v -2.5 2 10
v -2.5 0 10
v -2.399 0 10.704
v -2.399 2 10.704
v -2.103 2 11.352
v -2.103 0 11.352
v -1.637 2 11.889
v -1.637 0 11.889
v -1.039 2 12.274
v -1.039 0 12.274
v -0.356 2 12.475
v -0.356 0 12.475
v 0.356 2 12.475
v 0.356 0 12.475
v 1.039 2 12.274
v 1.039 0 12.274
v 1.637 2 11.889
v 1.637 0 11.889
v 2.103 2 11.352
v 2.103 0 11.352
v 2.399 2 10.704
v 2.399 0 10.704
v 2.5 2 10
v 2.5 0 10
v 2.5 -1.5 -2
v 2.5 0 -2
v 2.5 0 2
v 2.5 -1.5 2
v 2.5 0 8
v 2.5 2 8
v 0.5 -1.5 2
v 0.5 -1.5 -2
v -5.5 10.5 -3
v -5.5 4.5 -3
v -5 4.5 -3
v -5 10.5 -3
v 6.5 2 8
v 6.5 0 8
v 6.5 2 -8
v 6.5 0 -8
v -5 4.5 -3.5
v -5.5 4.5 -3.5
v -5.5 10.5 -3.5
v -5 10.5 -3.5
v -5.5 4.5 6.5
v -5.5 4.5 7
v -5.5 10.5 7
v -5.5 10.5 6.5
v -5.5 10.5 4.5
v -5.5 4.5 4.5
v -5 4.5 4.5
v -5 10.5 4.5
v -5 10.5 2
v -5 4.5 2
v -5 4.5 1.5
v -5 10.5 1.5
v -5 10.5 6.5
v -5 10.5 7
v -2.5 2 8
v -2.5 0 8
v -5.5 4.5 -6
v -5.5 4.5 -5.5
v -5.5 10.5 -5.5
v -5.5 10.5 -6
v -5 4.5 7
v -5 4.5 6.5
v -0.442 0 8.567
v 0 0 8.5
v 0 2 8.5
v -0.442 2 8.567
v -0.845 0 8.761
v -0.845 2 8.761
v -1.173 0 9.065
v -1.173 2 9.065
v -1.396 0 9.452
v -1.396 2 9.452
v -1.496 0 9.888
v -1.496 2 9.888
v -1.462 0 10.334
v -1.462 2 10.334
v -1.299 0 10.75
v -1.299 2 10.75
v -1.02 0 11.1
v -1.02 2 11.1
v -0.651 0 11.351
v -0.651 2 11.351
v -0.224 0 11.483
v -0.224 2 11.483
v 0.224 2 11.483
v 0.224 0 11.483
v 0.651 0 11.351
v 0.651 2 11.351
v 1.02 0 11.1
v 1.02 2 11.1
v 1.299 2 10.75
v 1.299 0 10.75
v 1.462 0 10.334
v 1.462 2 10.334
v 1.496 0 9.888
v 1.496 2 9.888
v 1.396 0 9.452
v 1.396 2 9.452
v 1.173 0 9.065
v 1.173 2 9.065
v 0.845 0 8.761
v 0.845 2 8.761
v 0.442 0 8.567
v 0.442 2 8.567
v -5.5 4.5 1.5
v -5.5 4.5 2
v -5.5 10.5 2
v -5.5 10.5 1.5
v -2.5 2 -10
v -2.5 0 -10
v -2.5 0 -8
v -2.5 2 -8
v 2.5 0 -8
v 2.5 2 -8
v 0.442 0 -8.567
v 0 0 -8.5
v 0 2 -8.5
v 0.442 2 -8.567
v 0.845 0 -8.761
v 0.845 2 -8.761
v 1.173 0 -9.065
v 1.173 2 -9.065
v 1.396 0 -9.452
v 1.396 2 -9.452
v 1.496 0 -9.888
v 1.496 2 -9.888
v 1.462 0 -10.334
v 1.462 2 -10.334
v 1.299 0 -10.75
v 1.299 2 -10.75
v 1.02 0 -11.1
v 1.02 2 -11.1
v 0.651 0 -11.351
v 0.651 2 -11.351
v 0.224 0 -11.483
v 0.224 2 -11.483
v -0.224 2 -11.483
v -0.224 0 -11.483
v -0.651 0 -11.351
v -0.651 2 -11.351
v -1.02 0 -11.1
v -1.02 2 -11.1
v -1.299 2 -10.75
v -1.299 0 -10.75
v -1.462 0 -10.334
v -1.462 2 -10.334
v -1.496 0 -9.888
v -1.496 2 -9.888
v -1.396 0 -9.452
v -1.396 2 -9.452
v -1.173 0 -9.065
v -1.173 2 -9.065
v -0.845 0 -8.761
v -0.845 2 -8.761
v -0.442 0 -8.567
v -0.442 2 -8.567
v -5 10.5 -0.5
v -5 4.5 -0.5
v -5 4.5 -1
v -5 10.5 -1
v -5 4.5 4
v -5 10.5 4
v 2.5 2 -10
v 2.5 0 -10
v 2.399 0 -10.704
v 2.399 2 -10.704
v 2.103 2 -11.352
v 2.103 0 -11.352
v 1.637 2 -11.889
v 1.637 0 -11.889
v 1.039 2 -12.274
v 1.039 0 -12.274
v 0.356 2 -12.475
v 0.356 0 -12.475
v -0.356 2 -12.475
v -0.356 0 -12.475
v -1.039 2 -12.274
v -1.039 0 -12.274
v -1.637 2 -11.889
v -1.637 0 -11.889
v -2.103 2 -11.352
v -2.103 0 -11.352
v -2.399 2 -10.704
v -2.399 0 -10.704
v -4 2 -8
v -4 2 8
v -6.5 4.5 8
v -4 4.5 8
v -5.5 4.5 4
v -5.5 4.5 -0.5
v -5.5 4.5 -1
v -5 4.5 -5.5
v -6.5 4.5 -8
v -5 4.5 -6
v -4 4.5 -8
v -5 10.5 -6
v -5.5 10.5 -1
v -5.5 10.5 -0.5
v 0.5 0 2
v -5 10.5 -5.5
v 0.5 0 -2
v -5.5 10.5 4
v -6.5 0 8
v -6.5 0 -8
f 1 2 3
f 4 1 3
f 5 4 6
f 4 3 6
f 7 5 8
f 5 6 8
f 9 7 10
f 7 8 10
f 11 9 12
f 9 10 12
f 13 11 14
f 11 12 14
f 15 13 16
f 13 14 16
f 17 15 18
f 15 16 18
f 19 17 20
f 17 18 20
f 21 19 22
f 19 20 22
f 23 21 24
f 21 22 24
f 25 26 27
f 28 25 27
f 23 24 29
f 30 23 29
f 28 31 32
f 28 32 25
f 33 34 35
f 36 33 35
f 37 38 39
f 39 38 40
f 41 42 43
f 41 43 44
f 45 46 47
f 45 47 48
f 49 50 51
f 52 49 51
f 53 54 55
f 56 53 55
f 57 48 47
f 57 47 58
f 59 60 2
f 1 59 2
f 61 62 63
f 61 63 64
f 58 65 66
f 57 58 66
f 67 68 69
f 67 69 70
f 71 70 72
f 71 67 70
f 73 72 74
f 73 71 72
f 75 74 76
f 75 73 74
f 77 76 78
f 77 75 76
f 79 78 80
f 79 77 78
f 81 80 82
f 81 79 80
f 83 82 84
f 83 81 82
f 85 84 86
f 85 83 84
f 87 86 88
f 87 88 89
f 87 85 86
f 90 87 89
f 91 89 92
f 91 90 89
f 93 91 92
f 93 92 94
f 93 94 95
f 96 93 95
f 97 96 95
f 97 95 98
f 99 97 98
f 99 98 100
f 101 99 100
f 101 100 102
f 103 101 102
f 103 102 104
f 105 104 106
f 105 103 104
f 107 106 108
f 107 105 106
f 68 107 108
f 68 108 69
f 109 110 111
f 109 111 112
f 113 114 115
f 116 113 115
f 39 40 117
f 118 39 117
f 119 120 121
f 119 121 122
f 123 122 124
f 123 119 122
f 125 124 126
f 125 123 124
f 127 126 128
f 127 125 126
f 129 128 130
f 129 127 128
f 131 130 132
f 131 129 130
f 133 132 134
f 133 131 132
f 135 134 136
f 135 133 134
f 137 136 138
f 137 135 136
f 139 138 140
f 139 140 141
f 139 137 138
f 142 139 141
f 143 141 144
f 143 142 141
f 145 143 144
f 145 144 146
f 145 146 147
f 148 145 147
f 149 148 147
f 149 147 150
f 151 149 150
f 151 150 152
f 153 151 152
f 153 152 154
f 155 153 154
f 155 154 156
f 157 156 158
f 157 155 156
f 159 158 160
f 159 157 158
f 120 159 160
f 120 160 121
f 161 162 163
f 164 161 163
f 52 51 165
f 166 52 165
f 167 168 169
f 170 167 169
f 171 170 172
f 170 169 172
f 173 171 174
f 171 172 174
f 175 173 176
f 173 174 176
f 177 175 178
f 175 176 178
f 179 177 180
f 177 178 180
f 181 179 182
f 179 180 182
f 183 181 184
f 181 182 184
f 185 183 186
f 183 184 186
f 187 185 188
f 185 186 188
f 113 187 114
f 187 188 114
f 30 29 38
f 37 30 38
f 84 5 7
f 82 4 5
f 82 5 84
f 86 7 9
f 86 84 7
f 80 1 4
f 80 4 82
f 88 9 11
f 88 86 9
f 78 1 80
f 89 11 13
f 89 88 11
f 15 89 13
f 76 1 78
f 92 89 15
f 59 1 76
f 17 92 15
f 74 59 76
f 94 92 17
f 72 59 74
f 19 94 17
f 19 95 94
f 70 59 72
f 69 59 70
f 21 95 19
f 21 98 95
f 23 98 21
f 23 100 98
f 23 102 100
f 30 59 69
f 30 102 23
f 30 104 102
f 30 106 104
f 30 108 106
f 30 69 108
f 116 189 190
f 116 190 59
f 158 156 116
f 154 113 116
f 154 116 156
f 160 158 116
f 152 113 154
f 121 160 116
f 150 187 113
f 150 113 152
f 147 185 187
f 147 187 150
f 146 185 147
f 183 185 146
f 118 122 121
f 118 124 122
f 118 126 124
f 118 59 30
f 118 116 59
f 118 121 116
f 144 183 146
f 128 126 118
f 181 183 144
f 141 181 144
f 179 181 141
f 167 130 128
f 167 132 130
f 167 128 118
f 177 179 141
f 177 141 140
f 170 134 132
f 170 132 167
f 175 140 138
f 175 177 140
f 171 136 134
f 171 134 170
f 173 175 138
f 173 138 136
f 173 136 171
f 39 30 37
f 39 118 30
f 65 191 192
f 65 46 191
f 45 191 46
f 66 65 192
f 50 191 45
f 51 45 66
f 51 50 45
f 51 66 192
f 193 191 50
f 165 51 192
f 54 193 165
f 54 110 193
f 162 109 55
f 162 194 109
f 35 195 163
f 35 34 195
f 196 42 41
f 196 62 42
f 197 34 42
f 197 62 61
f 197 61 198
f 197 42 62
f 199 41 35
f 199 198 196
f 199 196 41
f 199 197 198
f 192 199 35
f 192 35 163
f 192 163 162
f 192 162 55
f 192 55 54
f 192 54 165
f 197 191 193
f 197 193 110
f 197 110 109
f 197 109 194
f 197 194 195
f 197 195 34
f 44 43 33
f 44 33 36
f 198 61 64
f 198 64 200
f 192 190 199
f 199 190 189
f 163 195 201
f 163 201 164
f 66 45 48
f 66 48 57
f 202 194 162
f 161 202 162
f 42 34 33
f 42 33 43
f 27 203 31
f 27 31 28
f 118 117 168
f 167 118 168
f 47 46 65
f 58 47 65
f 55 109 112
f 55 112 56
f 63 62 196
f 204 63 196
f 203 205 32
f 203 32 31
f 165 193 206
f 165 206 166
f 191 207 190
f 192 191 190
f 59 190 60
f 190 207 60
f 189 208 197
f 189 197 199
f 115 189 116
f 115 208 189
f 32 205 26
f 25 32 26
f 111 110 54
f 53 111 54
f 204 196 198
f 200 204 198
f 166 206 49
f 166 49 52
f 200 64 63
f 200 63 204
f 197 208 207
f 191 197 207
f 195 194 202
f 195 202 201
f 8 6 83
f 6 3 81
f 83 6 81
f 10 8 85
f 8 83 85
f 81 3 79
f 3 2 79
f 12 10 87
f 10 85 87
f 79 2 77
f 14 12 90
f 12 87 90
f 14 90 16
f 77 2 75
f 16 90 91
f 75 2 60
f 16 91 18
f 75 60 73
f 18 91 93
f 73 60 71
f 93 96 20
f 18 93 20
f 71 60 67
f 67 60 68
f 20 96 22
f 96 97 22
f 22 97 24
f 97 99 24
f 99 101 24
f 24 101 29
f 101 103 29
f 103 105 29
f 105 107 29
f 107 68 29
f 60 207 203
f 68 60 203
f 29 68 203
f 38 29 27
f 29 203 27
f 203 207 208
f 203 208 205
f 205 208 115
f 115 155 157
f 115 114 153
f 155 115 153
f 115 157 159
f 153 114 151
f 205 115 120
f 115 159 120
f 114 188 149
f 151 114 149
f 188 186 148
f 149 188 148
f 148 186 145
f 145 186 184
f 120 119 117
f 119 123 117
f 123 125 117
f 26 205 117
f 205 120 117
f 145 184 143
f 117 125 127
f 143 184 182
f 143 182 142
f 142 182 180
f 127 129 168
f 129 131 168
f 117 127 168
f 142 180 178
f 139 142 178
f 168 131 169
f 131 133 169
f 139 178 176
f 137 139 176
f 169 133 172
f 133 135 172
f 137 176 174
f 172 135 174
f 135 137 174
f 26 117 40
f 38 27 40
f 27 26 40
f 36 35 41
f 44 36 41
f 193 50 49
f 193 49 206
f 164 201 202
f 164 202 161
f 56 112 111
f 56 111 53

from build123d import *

# Parameters (mm, degrees)
SKETCH1_R           = 1.5
BOSS_EXTRUDE1_DEPTH = 2
SKETCH2_W           = 2.5
SKETCH2_H           = 2.5
SKETCH2_H_2         = 3
BOSS_EXTRUDE2_DEPTH = 2.5
SKETCH3_W           = 0.5
SKETCH3_H           = 0.5
BOSS_EXTRUDE3_DEPTH = 6
SKETCH4_W           = 2
SKETCH4_H           = 4
BOSS_EXTRUDE4_DEPTH = 1.5


with BuildPart() as part:
    # Sketch1 → Boss-Extrude1 (new body)
    with BuildSketch(Plane(origin=(0, 0, 0), x_dir=(1, 0, 0), z_dir=(0, 1, 0))):
        with BuildLine():
            Line((-6.5, -8), (-2.5, -8))
            Line((-2.5, -8), (-2.5, -10))
            ThreePointArc((-2.5, -10), (0, -12.5), (2.5, -10))
            Line((2.5, -10), (2.5, -8))
            Line((2.5, -8), (6.5, -8))
            Line((6.5, -8), (6.5, 8))
            Line((6.5, 8), (2.5, 8))
            Line((2.5, 8), (2.5, 10))
            ThreePointArc((2.5, 10), (0, 12.5), (-2.5, 10))
            Line((-2.5, 10), (-2.5, 8))
            Line((-2.5, 8), (-6.5, 8))
            Line((-6.5, 8), (-6.5, -8))
        make_face()
        with Locations(Location((0, 10, 0), (0, 0, 270))):
            Circle(SKETCH1_R, mode=Mode.SUBTRACT)
        with Locations(Location((0, -10, 0), (0, 0, 90))):
            Circle(SKETCH1_R, mode=Mode.SUBTRACT)
    extrude(amount=BOSS_EXTRUDE1_DEPTH)

    # Sketch2 → Boss-Extrude2 (add)
    with BuildSketch(Plane(origin=(0, 2, 0), x_dir=(1, 0, 0), z_dir=(0, 1, 0))):
        with Locations((-5.25, -6.75)):
            Rectangle(SKETCH2_W, SKETCH2_H)
        with Locations((-5.25, -4.25)):
            Rectangle(SKETCH2_W, SKETCH2_H)
        with Locations((-5.25, -1.5)):
            Rectangle(SKETCH2_W, SKETCH2_H_2)
        with Locations((-5.25, 1.5)):
            Rectangle(SKETCH2_W, SKETCH2_H_2)
        with Locations((-5.25, 4.25)):
            Rectangle(SKETCH2_W, SKETCH2_H)
        with Locations((-5.25, 6.75)):
            Rectangle(SKETCH2_W, SKETCH2_H)
    extrude(amount=BOSS_EXTRUDE2_DEPTH)

    # Sketch3 → Boss-Extrude3 (add)
    with BuildSketch(Plane(origin=(0, 4.5, 0), x_dir=(1, 0, 0), z_dir=(0, 1, 0))):
        with Locations((-5.25, -6.75)):
            Rectangle(SKETCH3_W, SKETCH3_H)
        with Locations((-5.25, -4.25)):
            Rectangle(SKETCH3_W, SKETCH3_H)
        with Locations((-5.25, -1.75)):
            Rectangle(SKETCH3_W, SKETCH3_H)
        with Locations((-5.25, 0.75)):
            Rectangle(SKETCH3_W, SKETCH3_H)
        with Locations((-5.25, 3.25)):
            Rectangle(SKETCH3_W, SKETCH3_H)
        with Locations((-5.25, 5.75)):
            Rectangle(SKETCH3_W, SKETCH3_H)
    extrude(amount=BOSS_EXTRUDE3_DEPTH)

    # Sketch4 → Boss-Extrude4 (add)
    with BuildSketch(Plane.XZ):
        with Locations((1.5, 0)):
            Rectangle(SKETCH4_W, SKETCH4_H)
    extrude(amount=BOSS_EXTRUDE4_DEPTH)


solid = part.part
